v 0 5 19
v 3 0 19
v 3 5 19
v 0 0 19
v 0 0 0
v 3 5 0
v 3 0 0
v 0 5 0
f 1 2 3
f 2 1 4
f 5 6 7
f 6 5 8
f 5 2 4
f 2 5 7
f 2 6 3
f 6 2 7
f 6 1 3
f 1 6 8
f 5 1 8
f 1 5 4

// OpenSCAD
// Generated by SolidPython 1.0.1 on 2020-07-29 00:46:54


cube(size = [3, 5, 19]);
/***********************************************
*********      SolidPython code:      **********
************************************************
 
# import packages: SolidPython
from solid import *
from solid.utils import *
from itertools import chain, combinations, permutations


class Resize:

    def __init__(self, scad_file):
        self.scad_file = scad_file
        #self.scad_file = import_scad(scad_file)
        # cone/cylinder param:
        self.r1 = 0
        self.r2 = 0
        self.h = 0
        # rectangular prism param:
        self.w = 0
        self.l = 0
        # ellipse param:
        self.r = 0

    # import OpenScad code (file name corresponds to shape)


    # classify shape + parameters
    def assign(self, param1, param2, param3):
        if self.scad_file == 'cone.scad':
            self.r1 = param1
            self.r2 = param2
            self.h = param3
        elif self.scad_file == 'cylinder.scad':
            self.r1 = param1
            self.r2 = param2
            self.h = param3
        elif self.scad_file == 'rectangularPrism.scad':
            self.h = param1
            self.l = param2
            self.w = param3
        else:
            self.r = param1
            self.h = param2

    # resize parameters
    def iterate(self):
        x = range(3, 20, 2)
        i = 1
        if self.scad_file == 'cone.scad':
            tempList = list(permutations(x, 2))
            for temp in tempList:
                param1 = temp[0]
                param2 = temp[1]
                filepath = 'produced_scad_files/' + 'cone' + str(param1) + '_' + str(param2) + '_' + '.scad'
                scad_render_to_file(cylinder(h=param1, r1=param2, r2=0), filepath)

        elif self.scad_file == 'cylinder.scad':
            tempList = list(permutations(x, 3))
            for temp in tempList:
                param1 = temp[0]
                param2 = temp[1]
                filepath = 'produced_scad_files/' + 'cylinder' + str(param1) + '_' + str(param2) + '_' + '.scad'
                scad_render_to_file(cylinder(h=param1, r1=param2, r2=param2), filepath)

        elif self.scad_file == 'rectangularPrism.scad':
            tempList = list(permutations(x, 3))
            for temp in tempList:
                param1 = temp[0]
                param2 = temp[1]
                param3 = temp[2]
                filepath = 'produced_scad_files/' + 'rectangularPrism' + str(param1) + '_' + str(param2) + '_' + str(
                    param3) + '.scad'
                scad_render_to_file(cube(size=(param1, param2, param3)), filepath)

        elif self.scad_file == 'ellipse.scad':
            tempList = list(permutations(x, 4))
            for temp in tempList:
                param1 = temp[0]
                param2 = temp[1]
                param3 = temp[2]
                param4 = temp[3]
                filepath = 'produced_scad_files/' + 'ellipse' + str(param1) + '_' + str(param2) + '_' + str(param3) + '_' + str(param4) + '.scad'
                scad_render_to_file(scale([param1, param2, param3])(sphere(r=param4)), filepath)

    def render_to_scadfile(self):
        scad_render_to_file(scad, 'example.scad') 
 
************************************************/
